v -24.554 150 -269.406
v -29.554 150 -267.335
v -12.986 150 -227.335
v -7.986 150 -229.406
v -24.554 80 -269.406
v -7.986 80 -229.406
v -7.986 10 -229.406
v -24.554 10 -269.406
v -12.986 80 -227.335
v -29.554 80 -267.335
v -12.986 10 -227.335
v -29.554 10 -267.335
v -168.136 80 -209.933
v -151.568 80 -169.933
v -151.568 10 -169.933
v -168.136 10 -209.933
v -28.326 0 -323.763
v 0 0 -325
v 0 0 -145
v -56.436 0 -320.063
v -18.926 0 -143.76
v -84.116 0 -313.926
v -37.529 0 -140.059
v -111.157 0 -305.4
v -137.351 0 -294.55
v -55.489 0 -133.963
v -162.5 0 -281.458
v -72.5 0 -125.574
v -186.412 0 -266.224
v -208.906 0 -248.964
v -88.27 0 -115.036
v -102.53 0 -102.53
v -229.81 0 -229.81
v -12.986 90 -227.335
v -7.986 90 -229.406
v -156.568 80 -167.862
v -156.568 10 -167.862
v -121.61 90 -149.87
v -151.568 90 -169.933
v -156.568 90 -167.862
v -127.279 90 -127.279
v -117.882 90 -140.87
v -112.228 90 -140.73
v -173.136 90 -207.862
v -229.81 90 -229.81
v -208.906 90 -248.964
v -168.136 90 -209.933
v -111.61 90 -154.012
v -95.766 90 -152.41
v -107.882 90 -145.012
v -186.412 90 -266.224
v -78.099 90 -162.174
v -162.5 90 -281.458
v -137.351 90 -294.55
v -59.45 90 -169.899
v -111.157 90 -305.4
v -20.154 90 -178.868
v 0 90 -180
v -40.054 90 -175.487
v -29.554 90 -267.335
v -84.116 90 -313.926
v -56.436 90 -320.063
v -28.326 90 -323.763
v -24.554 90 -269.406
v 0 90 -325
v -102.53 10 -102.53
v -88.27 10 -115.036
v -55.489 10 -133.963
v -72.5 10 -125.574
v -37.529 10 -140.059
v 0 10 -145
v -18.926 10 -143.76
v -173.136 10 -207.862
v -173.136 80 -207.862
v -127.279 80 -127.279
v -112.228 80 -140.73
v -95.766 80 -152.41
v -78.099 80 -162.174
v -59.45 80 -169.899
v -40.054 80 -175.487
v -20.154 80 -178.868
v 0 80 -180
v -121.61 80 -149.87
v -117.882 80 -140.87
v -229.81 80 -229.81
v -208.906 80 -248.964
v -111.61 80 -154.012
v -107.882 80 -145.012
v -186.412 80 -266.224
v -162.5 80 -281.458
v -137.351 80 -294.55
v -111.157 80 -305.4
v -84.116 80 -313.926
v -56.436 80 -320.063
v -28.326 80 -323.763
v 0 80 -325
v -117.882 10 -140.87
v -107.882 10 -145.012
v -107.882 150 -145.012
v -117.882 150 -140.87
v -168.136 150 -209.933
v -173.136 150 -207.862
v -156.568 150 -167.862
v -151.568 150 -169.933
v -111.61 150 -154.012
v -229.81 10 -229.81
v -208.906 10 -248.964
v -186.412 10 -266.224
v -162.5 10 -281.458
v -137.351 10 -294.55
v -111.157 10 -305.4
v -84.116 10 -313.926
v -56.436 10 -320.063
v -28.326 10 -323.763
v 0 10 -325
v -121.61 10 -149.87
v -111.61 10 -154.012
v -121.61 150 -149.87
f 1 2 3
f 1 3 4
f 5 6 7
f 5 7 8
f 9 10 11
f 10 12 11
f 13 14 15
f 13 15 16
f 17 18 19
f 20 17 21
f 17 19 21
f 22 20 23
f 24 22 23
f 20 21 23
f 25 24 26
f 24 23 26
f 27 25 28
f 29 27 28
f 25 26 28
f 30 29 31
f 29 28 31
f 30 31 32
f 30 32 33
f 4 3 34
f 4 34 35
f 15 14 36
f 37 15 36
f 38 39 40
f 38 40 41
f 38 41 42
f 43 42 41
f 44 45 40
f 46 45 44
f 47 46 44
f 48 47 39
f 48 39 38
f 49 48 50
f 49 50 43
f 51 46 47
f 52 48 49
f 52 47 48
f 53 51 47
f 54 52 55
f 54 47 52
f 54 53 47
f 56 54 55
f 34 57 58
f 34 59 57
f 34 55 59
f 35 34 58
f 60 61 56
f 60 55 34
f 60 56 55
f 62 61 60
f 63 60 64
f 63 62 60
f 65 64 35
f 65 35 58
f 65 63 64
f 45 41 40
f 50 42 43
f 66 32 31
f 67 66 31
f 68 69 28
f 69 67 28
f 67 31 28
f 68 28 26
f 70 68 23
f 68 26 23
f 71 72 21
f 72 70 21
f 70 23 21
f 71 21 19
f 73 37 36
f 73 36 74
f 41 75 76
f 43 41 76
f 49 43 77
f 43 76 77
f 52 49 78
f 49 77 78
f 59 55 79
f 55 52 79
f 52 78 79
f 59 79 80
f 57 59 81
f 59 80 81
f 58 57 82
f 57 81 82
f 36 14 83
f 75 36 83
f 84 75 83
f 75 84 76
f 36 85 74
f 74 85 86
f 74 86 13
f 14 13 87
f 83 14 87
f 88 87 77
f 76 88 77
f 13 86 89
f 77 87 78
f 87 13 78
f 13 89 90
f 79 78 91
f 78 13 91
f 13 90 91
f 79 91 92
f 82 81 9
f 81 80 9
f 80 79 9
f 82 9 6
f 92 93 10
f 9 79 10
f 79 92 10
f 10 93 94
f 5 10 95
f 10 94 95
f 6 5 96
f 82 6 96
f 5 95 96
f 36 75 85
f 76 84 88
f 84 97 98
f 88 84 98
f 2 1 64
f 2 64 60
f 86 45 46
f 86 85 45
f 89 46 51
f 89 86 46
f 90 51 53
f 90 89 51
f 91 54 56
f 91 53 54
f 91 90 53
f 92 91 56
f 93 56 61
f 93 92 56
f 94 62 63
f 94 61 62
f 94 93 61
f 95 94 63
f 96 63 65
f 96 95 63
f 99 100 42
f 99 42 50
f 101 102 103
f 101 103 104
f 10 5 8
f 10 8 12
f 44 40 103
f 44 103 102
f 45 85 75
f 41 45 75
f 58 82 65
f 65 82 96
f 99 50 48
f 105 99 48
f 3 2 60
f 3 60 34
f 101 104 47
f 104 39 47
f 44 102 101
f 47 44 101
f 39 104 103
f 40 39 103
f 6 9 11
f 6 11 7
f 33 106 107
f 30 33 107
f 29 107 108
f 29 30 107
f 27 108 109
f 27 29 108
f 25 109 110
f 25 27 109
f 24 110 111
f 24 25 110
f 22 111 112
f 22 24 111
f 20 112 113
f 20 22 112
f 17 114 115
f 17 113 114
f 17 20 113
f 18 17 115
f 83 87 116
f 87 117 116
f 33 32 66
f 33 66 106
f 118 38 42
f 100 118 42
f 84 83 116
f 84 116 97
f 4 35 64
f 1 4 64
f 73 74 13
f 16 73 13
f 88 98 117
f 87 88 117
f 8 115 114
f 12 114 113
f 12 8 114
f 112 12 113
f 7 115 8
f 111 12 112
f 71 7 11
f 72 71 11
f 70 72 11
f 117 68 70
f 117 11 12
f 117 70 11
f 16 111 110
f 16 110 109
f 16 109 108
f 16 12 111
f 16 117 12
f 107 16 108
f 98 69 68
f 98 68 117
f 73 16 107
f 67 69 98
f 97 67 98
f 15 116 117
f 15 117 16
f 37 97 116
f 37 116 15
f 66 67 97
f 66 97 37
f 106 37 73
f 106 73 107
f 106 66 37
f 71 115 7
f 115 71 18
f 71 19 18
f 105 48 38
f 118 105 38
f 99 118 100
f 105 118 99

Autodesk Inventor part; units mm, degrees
ref_plane "YZ Plane" through (0, 0, 0) normal (1, 0, 0) x (0, 1, 0)
ref_plane "XZ Plane" through (0, 0, 0) normal (0, 1, 0) x (-1, 0, 0)
ref_plane "XY Plane" through (0, 0, 0) normal (0, 0, 1) x (1, 0, 0)
sketch "Sketch1" plane through (0, 0, 0) normal (0, 1, 0) x (-1, 0, 0)
  circle A0 centre (0, 0) radius 145
  circle A1 centre (0, 0) radius 325
  line L0 (0, 0) -> (325, 0)
  line L1 (0, 0) -> (0, -325)
  line L2 (0, 0) -> (229.8097, -229.8097)
  line L3 (229.8097, -229.8097) -> (0, -145) construction
  line L4 (1.3869, -199.3328) -> (139.9689, -141.9303)
  line L5 (139.9689, -141.9303) -> (178.2372, -234.3183)
  line L6 (178.2372, -234.3183) -> (39.6553, -291.7208)
  line L7 (39.6553, -291.7208) -> (1.3869, -199.3328)
  line L8 (102.5305, -102.5305) -> (0, -325) construction
  circle A2 centre (0, 0) radius 306.4883 construction
  line L9 (178.2372, -234.3183) -> (1.3869, -199.3328) construction
  line L10 (139.9689, -141.9303) -> (39.6553, -291.7208) construction
  line L11 (89.8121, -216.8255) -> (108.9463, -263.0195) construction
  line L12 (0, 0) -> (124.3721, -300.2608) construction
  line L13 (199.3328, -1.3869) -> (291.7208, -39.6553)
  line L14 (141.9303, -139.9689) -> (199.3328, -1.3869)
  line L15 (234.3183, -178.2372) -> (141.9303, -139.9689)
  line L16 (291.7208, -39.6553) -> (234.3183, -178.2372)
  line L17 (141.9303, 139.9689) -> (234.3183, 178.2372)
  line L18 (199.3328, 1.3869) -> (141.9303, 139.9689)
  line L19 (291.7208, 39.6553) -> (199.3328, 1.3869)
  line L20 (234.3183, 178.2372) -> (291.7208, 39.6553)
  line L21 (1.3869, 199.3328) -> (39.6553, 291.7208)
  line L22 (139.9689, 141.9303) -> (1.3869, 199.3328)
  line L23 (178.2372, 234.3183) -> (139.9689, 141.9303)
  line L24 (39.6553, 291.7208) -> (178.2372, 234.3183)
  line L25 (-139.9689, 141.9303) -> (-178.2372, 234.3183)
  line L26 (-1.3869, 199.3328) -> (-139.9689, 141.9303)
  line L27 (-39.6553, 291.7208) -> (-1.3869, 199.3328)
  line L28 (-178.2372, 234.3183) -> (-39.6553, 291.7208)
  line L29 (-199.3328, 1.3869) -> (-291.7208, 39.6553)
  line L30 (-141.9303, 139.9689) -> (-199.3328, 1.3869)
  line L31 (-234.3183, 178.2372) -> (-141.9303, 139.9689)
  line L32 (-291.7208, 39.6553) -> (-234.3183, 178.2372)
  line L33 (-141.9303, -139.9689) -> (-234.3183, -178.2372)
  line L34 (-199.3328, -1.3869) -> (-141.9303, -139.9689)
  line L35 (-291.7208, -39.6553) -> (-199.3328, -1.3869)
  line L36 (-234.3183, -178.2372) -> (-291.7208, -39.6553)
  line L37 (-1.3869, -199.3328) -> (-39.6553, -291.7208)
  line L38 (-139.9689, -141.9303) -> (-1.3869, -199.3328)
  line L39 (-178.2372, -234.3183) -> (-139.9689, -141.9303)
  line L40 (-39.6553, -291.7208) -> (-178.2372, -234.3183)
  circle A3 centre (0, 0) radius 235 construction
  point P0 (263.0195, -108.9463)
  point P1 (263.0195, 108.9463)
  point P2 (108.9463, 263.0195)
  point P3 (-108.9463, 263.0195)
  point P4 (-263.0195, 108.9463)
  point P5 (-263.0195, -108.9463)
  point P6 (-108.9463, -263.0195)
  dimension "d1" = 180
  dimension "d3" = 45
  dimension "d4" = 650
  dimension "d11" = 150
  dimension "d12" = 100
  dimension "d13" = 22.5
  dimension "d16" = 360
  dimension "d18" = 90
extrude "Extrusion1" add sketch "Sketch1" along normal blind 10 contours A0 L2 A1 L1 | L4 L5 L6 L7
sketch "Sketch2" plane through (0, 10, 0) normal (0, 1, 0) x (1, 0, 0)
  circle A0 centre (0, 0) radius 325
  circle A1 centre (0, 0) radius 145
  line L0 (0, 0) -> (-325, 0)
  line L1 (0, 145) -> (0, 325) projected
  line L2 (0, 0) -> (0, 325)
  arc A2 (0, 325) -> (-229.8097, 229.8097) centre (0, 0) ccw projected
  line L3 (0, 0) -> (-229.8097, 229.8097)
  circle A3 centre (0, 0) radius 235 construction
  line L4 (0, 0) -> (-124.3721, 300.2608) construction
  line L5 (-1.5055, 199.619) -> (-140.0874, 142.2165)
  line L6 (-140.0874, 142.2165) -> (-178.3557, 234.6044)
  line L7 (-178.3557, 234.6044) -> (-39.7738, 292.0069)
  line L8 (-39.7738, 292.0069) -> (-1.5055, 199.619)
  line L9 (-1.5055, 199.619) -> (-178.3557, 234.6044) construction
  line L10 (-140.0874, 142.2165) -> (-39.7738, 292.0069) construction
  circle A4 centre (0, 0) radius 185
  line L11 (-199.619, 1.5055) -> (-292.0069, 39.7738)
  line L12 (-142.2165, 140.0874) -> (-199.619, 1.5055)
  line L13 (-234.6044, 178.3557) -> (-142.2165, 140.0874)
  line L14 (-292.0069, 39.7738) -> (-234.6044, 178.3557)
  line L15 (-199.619, 1.5055) -> (-234.6044, 178.3557) construction
  line L16 (-142.2165, 140.0874) -> (-292.0069, 39.7738) construction
  line L17 (-142.2165, -140.0874) -> (-234.6044, -178.3557)
  line L18 (-199.619, -1.5055) -> (-142.2165, -140.0874)
  line L19 (-292.0069, -39.7738) -> (-199.619, -1.5055)
  line L20 (-234.6044, -178.3557) -> (-292.0069, -39.7738)
  line L21 (-142.2165, -140.0874) -> (-292.0069, -39.7738) construction
  line L22 (-199.619, -1.5055) -> (-234.6044, -178.3557) construction
  line L23 (-1.5055, -199.619) -> (-39.7738, -292.0069)
  line L24 (-140.0874, -142.2165) -> (-1.5055, -199.619)
  line L25 (-178.3557, -234.6044) -> (-140.0874, -142.2165)
  line L26 (-39.7738, -292.0069) -> (-178.3557, -234.6044)
  line L27 (-1.5055, -199.619) -> (-178.3557, -234.6044) construction
  line L28 (-140.0874, -142.2165) -> (-39.7738, -292.0069) construction
  line L29 (140.0874, -142.2165) -> (178.3557, -234.6044)
  line L30 (1.5055, -199.619) -> (140.0874, -142.2165)
  line L31 (39.7738, -292.0069) -> (1.5055, -199.619)
  line L32 (178.3557, -234.6044) -> (39.7738, -292.0069)
  line L33 (140.0874, -142.2165) -> (39.7738, -292.0069) construction
  line L34 (1.5055, -199.619) -> (178.3557, -234.6044) construction
  line L35 (199.619, -1.5055) -> (292.0069, -39.7738)
  line L36 (142.2165, -140.0874) -> (199.619, -1.5055)
  line L37 (234.6044, -178.3557) -> (142.2165, -140.0874)
  line L38 (292.0069, -39.7738) -> (234.6044, -178.3557)
  line L39 (199.619, -1.5055) -> (234.6044, -178.3557) construction
  line L40 (142.2165, -140.0874) -> (292.0069, -39.7738) construction
  line L41 (142.2165, 140.0874) -> (234.6044, 178.3557)
  line L42 (199.619, 1.5055) -> (142.2165, 140.0874)
  line L43 (292.0069, 39.7738) -> (199.619, 1.5055)
  line L44 (234.6044, 178.3557) -> (292.0069, 39.7738)
  line L45 (142.2165, 140.0874) -> (292.0069, 39.7738) construction
  line L46 (199.619, 1.5055) -> (234.6044, 178.3557) construction
  line L47 (1.5055, 199.619) -> (39.7738, 292.0069)
  line L48 (140.0874, 142.2165) -> (1.5055, 199.619)
  line L49 (178.3557, 234.6044) -> (140.0874, 142.2165)
  line L50 (39.7738, 292.0069) -> (178.3557, 234.6044)
  line L51 (1.5055, 199.619) -> (178.3557, 234.6044) construction
  line L52 (140.0874, 142.2165) -> (39.7738, 292.0069) construction
  line L53 (-151.5679, 169.9328) -> (-156.5679, 167.8618)
  line L54 (-156.5679, 167.8618) -> (-173.1364, 207.8618)
  line L55 (-173.1364, 207.8618) -> (-168.1364, 209.9328)
  line L56 (-168.1364, 209.9328) -> (-151.5679, 169.9328)
  line L57 (-151.5679, 169.9328) -> (-173.1364, 207.8618) construction
  line L58 (-156.5679, 167.8618) -> (-168.1364, 209.9328) construction
  line L59 (-12.986, 227.3354) -> (-7.986, 229.4064)
  line L60 (-7.986, 229.4064) -> (-24.5545, 269.4064)
  line L61 (-24.5545, 269.4064) -> (-29.5545, 267.3354)
  line L62 (-12.986, 227.3354) -> (-24.5545, 269.4064) construction
  line L63 (-7.986, 229.4064) -> (-29.5545, 267.3354) construction
  line L64 (-111.6098, 154.0123) -> (-121.6098, 149.8701)
  line L65 (-121.6098, 149.8701) -> (-117.8819, 140.8701)
  line L66 (-117.8819, 140.8701) -> (-107.8819, 145.0123)
  line L67 (-107.8819, 145.0123) -> (-111.6098, 154.0123)
  line L68 (-111.6098, 154.0123) -> (-117.8819, 140.8701) construction
  line L69 (-121.6098, 149.8701) -> (-107.8819, 145.0123) construction
  point P0 (-89.9306, 217.1117)
  point P1 (-217.1117, 89.9306)
  point P2 (-217.1117, -89.9306)
  point P3 (-89.9306, -217.1117)
  point P4 (89.9306, -217.1117)
  point P5 (217.1117, -89.9306)
  point P6 (217.1117, 89.9306)
  point P7 (89.9306, 217.1117)
  point P8 (-68.8241, 166.1562)
  point P9 (-29.5545, 267.3354)
  point P10 (-12.986, 227.3354)
  point P11 (-151.5679, 169.9328)
  dimension "d22" = 180
  dimension "d23" = 650
  dimension "d24" = 90
  dimension "d25" = 100
  dimension "d26" = 150
  dimension "d27" = 40
  dimension "d30" = 360
  dimension "d32" = 40
  dimension "d33" = 5
  dimension "d34" = 9
  dimension "d35" = 10
  dimension "d39" = 30
  dimension "d40" = 20
extrude "Extrusion2" add sketch "Sketch2" along normal blind 140 contours L65 L5 L67 A4 | A4 L67 L66 L65 | L8 L61 L60 L59 | L53 L54 L55 L6
ref_plane "Work Plane1" through (0, 80, 0) normal (0, 1, 0) x (1, 0, 0)
sketch "Sketch4" plane through (0, 80, 0) normal (0, 1, 0) x (1, 0, 0)
  line L0 (-24.5545, 269.4064) -> (-7.986, 229.4064) projected
  line L1 (-7.986, 229.4064) -> (-12.986, 227.3354) projected
  line L2 (-12.986, 227.3354) -> (-29.5545, 267.3354) projected
  line L3 (-29.5545, 267.3354) -> (-24.5545, 269.4064) projected
  line L4 (-156.5679, 167.8618) -> (-173.1364, 207.8618) projected
  line L5 (-173.1364, 207.8618) -> (-168.1364, 209.9328) projected
  line L6 (-168.1364, 209.9328) -> (-151.5679, 169.9328) projected
  line L7 (-151.5679, 169.9328) -> (-156.5679, 167.8618) projected
  line L8 (-107.8819, 145.0123) -> (-117.8819, 140.8701) projected
  line L9 (-117.8819, 140.8701) -> (-121.6098, 149.8701) projected
  line L10 (-121.6098, 149.8701) -> (-111.6098, 154.0123) projected
  line L11 (-111.6098, 154.0123) -> (-107.8819, 145.0123) projected
  arc A0 (0, 145) -> (-102.5305, 102.5305) centre (0, 0) ccw projected
  line L12 (0, 145) -> (0, 325) projected
  arc A1 (0, 325) -> (-229.8097, 229.8097) centre (0, 0) ccw projected
  line L13 (-229.8097, 229.8097) -> (-102.5305, 102.5305) projected
  arc A2 (0, 180) -> (-127.2792, 127.2792) centre (0, 0) ccw
  dimension "d44" = 35
extrude "Extrusion3" add sketch "Sketch4" along normal blind 10 contours A2 L13 A1 L12
properties part number "Carousel Container Plate"
